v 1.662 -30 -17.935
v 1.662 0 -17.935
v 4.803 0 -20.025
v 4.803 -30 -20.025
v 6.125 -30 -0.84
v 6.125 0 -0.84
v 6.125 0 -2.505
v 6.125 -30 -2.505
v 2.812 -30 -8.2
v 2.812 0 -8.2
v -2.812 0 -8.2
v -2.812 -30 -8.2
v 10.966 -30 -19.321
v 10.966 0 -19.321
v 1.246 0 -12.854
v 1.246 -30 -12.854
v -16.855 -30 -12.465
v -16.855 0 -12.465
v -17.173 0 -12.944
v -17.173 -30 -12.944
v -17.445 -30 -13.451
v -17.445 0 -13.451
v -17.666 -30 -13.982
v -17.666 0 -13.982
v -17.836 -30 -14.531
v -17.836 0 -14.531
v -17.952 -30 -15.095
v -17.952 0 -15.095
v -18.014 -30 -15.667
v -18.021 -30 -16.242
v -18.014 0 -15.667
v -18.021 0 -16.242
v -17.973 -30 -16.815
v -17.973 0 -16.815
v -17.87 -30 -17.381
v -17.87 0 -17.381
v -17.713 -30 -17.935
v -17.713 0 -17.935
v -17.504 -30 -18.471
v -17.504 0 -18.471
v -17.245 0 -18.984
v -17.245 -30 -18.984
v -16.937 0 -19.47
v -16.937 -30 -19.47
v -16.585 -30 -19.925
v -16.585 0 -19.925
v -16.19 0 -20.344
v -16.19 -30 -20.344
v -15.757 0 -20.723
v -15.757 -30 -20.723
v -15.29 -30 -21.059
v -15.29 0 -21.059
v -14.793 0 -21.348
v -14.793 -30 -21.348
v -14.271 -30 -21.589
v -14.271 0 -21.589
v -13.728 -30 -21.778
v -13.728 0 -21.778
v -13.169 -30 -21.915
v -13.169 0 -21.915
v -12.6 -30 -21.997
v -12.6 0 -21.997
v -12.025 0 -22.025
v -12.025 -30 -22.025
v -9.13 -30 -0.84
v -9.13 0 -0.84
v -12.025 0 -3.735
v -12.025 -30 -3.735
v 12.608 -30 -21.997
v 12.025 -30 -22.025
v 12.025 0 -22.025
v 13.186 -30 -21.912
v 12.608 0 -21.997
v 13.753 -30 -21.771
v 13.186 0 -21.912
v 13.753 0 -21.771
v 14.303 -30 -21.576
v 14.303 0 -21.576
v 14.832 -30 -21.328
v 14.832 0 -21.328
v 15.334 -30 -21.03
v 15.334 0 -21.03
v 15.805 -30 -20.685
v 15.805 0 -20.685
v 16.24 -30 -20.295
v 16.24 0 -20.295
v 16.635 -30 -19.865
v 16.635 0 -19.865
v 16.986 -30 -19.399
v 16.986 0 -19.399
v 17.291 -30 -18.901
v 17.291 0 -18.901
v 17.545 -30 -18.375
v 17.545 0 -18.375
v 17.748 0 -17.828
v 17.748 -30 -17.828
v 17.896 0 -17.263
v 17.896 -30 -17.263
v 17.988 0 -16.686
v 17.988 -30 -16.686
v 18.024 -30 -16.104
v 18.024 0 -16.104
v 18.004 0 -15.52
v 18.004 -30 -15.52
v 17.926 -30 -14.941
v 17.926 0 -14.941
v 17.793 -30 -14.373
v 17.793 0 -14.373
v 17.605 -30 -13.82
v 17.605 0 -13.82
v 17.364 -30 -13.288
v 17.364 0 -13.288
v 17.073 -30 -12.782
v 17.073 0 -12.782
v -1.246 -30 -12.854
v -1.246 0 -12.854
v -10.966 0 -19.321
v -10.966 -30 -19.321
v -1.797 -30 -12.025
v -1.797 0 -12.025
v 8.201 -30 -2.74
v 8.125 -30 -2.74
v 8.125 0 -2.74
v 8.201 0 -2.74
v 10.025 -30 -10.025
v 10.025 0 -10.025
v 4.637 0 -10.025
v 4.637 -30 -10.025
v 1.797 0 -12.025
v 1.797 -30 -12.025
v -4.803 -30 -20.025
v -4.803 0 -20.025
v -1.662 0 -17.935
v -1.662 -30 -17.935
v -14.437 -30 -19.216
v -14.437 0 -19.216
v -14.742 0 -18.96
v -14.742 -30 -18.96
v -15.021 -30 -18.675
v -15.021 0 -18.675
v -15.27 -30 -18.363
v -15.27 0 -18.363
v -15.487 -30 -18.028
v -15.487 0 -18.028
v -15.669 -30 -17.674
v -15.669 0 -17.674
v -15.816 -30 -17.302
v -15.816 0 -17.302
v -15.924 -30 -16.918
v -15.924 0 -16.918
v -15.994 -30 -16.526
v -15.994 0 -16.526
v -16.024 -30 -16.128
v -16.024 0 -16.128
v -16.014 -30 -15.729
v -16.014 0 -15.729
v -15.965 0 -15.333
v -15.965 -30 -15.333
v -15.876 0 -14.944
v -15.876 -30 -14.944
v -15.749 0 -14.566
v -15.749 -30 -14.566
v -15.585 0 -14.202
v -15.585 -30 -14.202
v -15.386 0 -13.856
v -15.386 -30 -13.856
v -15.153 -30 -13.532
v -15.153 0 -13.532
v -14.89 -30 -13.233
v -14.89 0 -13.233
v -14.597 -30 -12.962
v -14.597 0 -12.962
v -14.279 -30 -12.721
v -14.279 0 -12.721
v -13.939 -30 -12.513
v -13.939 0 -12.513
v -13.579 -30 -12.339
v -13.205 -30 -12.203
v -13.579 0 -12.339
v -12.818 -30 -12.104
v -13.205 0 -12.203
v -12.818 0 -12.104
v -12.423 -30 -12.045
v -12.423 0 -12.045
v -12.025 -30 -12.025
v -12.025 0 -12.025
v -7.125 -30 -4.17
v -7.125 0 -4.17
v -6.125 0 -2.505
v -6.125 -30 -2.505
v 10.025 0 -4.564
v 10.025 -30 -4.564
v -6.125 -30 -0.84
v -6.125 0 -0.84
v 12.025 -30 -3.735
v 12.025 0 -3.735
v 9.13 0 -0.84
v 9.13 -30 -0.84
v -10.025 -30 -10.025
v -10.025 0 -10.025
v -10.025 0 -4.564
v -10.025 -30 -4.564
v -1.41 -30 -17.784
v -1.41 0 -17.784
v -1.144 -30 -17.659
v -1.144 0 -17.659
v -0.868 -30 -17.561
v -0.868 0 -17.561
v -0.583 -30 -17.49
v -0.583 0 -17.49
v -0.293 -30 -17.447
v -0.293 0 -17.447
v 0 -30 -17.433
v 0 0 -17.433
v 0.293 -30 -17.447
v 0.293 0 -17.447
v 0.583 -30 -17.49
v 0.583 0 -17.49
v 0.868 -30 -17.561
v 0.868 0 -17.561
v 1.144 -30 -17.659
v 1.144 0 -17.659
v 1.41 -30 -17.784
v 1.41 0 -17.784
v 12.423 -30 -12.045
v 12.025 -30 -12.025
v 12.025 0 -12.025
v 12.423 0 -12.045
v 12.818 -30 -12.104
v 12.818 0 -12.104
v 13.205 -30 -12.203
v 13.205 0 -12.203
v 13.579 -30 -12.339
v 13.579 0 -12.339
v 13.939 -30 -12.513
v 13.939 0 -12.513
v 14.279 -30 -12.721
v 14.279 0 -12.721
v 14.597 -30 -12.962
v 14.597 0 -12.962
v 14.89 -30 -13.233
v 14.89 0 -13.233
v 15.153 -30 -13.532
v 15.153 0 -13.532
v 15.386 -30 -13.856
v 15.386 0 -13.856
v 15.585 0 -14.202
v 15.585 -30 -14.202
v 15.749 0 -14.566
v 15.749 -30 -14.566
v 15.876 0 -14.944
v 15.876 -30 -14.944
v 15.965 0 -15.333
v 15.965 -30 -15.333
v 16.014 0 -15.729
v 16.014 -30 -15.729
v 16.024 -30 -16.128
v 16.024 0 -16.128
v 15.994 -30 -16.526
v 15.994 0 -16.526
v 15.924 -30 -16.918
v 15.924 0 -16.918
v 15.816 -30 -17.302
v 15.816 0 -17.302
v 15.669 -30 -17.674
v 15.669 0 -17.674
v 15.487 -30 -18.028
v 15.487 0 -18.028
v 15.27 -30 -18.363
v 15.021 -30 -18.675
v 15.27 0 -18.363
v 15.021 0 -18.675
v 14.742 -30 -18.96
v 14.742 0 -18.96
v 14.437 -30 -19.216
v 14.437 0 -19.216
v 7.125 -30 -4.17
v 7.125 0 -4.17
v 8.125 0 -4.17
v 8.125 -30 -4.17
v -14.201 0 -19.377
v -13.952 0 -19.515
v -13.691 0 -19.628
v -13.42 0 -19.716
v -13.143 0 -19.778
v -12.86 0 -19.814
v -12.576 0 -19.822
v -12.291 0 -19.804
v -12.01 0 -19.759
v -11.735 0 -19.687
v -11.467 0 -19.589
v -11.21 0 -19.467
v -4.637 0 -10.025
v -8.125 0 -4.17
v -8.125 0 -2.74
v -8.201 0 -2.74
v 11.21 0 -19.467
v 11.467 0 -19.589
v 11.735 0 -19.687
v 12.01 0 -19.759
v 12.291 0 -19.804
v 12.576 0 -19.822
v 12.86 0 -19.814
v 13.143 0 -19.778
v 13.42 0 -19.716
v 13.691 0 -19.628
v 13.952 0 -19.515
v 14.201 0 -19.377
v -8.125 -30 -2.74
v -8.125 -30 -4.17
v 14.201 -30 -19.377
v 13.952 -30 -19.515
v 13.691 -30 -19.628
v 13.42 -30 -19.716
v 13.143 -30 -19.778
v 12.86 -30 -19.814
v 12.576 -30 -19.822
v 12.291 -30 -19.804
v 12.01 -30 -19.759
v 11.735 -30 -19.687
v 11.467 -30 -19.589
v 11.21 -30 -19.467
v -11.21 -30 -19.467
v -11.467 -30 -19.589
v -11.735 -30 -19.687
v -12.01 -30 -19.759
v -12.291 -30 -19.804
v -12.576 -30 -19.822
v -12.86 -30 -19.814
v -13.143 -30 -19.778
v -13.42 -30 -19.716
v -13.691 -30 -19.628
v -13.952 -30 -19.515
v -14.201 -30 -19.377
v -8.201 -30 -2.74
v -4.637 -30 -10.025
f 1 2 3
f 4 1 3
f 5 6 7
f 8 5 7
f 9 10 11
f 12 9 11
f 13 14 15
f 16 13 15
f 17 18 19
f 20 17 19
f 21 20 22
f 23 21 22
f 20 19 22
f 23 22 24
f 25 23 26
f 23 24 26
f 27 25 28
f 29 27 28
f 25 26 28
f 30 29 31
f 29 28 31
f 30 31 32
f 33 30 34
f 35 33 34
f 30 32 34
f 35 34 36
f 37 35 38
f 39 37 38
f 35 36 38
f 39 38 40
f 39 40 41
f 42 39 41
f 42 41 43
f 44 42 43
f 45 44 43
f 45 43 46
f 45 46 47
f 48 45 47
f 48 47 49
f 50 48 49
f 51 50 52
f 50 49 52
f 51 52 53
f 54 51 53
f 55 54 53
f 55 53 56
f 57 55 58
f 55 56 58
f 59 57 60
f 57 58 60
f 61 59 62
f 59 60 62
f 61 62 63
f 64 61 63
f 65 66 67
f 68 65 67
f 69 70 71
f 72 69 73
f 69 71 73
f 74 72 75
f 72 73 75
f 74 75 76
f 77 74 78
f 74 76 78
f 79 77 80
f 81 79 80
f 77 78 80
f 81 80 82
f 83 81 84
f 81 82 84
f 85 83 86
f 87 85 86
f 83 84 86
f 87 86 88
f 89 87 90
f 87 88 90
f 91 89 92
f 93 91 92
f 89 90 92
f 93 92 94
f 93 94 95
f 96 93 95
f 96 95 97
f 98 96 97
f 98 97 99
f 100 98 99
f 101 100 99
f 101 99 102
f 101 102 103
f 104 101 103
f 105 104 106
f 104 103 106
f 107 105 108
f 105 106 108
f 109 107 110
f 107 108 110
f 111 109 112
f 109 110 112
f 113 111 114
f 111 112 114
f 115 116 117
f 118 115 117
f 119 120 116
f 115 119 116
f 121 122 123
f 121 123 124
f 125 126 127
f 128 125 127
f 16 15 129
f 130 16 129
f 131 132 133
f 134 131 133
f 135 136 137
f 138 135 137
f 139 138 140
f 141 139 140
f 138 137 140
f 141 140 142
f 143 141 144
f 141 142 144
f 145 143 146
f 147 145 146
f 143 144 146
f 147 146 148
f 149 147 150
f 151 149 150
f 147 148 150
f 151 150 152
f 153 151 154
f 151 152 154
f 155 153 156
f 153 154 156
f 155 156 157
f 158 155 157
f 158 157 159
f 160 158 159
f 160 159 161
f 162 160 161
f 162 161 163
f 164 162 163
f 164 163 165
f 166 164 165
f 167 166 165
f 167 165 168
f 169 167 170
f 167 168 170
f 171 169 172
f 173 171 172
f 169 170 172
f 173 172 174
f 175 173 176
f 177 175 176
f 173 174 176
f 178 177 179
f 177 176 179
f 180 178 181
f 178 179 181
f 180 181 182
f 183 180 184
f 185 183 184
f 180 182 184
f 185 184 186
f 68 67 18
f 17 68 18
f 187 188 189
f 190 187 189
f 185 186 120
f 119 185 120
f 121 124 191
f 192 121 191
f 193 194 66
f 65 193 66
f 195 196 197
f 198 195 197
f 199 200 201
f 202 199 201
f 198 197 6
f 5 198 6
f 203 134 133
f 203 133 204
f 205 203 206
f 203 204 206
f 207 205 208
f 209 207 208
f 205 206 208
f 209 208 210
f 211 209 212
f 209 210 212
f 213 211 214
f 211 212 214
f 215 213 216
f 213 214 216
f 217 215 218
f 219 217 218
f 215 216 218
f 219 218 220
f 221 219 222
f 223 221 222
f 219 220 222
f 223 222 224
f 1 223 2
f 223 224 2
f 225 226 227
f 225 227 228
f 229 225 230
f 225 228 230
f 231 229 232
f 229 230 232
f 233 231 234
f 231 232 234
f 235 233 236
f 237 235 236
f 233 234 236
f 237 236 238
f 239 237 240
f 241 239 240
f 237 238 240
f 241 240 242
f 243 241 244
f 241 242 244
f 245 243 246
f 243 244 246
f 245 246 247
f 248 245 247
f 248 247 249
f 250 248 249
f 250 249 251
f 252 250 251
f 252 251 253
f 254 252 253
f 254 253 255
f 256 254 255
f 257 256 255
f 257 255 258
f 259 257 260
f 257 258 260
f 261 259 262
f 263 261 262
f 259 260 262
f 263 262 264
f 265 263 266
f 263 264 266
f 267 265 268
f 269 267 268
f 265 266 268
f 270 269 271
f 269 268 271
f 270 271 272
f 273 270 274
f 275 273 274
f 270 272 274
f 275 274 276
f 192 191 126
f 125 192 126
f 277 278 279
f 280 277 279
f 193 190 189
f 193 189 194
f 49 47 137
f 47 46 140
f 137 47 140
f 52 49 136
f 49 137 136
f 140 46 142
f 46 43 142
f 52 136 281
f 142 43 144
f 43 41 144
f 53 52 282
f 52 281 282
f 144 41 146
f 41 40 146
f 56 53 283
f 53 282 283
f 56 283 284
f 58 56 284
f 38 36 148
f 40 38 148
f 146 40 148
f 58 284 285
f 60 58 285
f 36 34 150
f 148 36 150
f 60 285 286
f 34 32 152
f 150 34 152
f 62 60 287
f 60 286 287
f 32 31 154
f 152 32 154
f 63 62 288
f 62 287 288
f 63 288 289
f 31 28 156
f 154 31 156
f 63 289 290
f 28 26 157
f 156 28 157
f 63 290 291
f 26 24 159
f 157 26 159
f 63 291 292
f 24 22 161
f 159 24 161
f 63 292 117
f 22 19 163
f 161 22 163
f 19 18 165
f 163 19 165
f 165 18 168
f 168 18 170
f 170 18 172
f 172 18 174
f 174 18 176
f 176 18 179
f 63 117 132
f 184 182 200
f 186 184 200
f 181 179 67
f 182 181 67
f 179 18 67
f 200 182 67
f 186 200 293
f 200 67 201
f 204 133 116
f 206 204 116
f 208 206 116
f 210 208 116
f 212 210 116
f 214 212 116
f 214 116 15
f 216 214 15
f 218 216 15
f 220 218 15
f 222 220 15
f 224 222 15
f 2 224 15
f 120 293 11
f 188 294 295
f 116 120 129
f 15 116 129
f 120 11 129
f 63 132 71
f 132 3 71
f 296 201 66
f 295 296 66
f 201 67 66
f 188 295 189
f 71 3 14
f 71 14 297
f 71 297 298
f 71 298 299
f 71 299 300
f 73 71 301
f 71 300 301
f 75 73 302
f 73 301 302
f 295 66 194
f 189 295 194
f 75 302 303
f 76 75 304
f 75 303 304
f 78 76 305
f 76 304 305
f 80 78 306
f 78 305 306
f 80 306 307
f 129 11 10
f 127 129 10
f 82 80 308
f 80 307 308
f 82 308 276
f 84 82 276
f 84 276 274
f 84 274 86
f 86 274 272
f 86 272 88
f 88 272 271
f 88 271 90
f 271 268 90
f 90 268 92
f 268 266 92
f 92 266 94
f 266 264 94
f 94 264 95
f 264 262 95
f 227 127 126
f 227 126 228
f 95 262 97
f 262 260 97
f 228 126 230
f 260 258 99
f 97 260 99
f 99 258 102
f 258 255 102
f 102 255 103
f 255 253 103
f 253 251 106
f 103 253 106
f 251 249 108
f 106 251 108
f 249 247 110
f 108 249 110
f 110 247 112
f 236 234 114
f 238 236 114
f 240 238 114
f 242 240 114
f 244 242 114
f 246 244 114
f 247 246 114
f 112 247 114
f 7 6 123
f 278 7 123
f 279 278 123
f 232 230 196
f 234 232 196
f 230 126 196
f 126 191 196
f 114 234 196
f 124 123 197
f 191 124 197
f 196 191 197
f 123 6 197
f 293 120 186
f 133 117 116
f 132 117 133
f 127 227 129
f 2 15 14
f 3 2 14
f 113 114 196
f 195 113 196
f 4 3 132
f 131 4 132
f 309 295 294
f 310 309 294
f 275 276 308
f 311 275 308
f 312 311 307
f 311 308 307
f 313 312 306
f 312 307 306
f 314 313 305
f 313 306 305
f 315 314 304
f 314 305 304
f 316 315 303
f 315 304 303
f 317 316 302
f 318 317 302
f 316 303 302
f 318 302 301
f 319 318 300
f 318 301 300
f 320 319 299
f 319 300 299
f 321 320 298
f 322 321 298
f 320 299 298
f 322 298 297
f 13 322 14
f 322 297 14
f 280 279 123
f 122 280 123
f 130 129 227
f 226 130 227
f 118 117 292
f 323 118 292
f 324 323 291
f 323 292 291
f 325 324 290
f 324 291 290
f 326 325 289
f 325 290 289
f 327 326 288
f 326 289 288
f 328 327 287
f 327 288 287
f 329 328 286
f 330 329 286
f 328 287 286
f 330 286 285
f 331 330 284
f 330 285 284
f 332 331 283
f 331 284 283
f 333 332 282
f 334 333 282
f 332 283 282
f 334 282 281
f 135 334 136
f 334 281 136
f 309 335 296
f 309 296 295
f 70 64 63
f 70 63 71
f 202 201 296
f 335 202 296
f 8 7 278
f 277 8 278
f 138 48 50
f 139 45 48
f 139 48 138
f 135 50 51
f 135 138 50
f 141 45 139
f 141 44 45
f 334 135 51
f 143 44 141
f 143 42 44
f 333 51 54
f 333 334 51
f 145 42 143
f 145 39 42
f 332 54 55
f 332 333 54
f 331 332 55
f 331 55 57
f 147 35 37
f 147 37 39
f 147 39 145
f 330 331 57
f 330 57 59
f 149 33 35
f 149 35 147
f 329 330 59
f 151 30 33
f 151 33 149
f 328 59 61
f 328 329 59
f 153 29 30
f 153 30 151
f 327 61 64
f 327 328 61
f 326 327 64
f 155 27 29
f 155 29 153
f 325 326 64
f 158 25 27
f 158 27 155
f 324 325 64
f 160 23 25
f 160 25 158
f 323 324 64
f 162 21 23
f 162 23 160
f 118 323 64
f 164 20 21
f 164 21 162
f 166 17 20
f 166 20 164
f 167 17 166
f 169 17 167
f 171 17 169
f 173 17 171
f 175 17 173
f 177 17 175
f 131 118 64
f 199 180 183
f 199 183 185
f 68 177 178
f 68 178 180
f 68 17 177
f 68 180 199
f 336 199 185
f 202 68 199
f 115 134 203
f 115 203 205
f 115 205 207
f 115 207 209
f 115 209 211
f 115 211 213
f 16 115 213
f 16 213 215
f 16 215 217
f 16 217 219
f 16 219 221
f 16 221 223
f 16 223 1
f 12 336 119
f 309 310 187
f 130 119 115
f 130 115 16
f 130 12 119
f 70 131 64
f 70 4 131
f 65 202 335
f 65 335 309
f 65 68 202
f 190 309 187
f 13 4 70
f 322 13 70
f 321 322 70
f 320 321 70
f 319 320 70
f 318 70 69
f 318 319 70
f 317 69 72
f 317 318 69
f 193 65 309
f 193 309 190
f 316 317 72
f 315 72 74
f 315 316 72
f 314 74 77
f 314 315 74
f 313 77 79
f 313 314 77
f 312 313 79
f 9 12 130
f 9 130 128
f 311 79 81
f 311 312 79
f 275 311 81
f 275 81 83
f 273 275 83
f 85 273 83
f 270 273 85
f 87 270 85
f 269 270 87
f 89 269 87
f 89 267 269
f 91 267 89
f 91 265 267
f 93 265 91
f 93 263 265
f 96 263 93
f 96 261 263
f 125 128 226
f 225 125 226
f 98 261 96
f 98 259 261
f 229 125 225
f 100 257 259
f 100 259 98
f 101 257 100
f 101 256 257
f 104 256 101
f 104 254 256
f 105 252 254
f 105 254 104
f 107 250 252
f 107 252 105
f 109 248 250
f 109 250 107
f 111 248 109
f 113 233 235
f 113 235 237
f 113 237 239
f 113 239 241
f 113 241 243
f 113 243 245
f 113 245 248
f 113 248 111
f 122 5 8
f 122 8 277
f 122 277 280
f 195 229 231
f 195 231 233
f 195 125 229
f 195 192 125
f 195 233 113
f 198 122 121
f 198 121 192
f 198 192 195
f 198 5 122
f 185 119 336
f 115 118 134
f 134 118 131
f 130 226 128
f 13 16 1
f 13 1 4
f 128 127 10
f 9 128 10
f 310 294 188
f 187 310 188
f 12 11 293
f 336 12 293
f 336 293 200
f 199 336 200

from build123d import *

# Parameters (mm, degrees)
F1_DEPTH = 30


with BuildPart() as f1:
    # F0 (on Front) → F1 (new body)
    with BuildSketch(Plane.XZ):
        with BuildLine():
            Line((-10.025, -10.025), (-10.025, -4.563699))
            Line((-10.025, -4.563699), (-8.201301, -2.74))
            Line((-8.201301, -2.74), (-8.125, -2.74))
            Line((-8.125, -2.74), (-8.125, -4.16967))
            Line((-8.125, -4.16967), (-7.125, -4.16967))
            Line((-7.125, -4.16967), (-6.125, -2.504835))
            Line((-6.125, -2.504835), (-6.125, -0.84))
            Line((-6.125, -0.84), (-9.129728, -0.84))
            Line((-9.129728, -0.84), (-12.025, -3.735272))
            Line((-12.025, -3.735272), (-16.854638, -12.46486))
            ThreePointArc((-16.854638, -12.46486), (-17.38041, -18.730472), (-12.025, -22.025))
            Line((-12.025, -22.025), (12.025, -22.025))
            ThreePointArc((12.025, -22.025), (17.29087, -18.900868), (17.072982, -12.781872))
            Line((17.072982, -12.781872), (12.025, -3.735272))
            Line((12.025, -3.735272), (9.129728, -0.84))
            Line((9.129728, -0.84), (6.125, -0.84))
            Line((6.125, -0.84), (6.125, -2.504835))
            Line((6.125, -2.504835), (7.125, -4.16967))
            Line((7.125, -4.16967), (8.125, -4.16967))
            Line((8.125, -4.16967), (8.125, -2.74))
            Line((8.125, -2.74), (8.201301, -2.74))
            Line((8.201301, -2.74), (10.025, -4.563699))
            Line((10.025, -4.563699), (10.025, -10.025))
            Line((10.025, -10.025), (4.636716, -10.025))
            Line((4.636716, -10.025), (2.811716, -8.2))
            Line((2.811716, -8.2), (-2.811716, -8.2))
            Line((-2.811716, -8.2), (-4.636716, -10.025))
            Line((-4.636716, -10.025), (-8.125, -10.025))
            Line((-8.125, -10.025), (-10.025, -10.025))
        make_face()
        with BuildLine():
            ThreePointArc((-14.436503, -19.21634), (-15.81745, -14.753261), (-12.025, -12.025))
            Line((-12.025, -12.025), (-1.797092, -12.025))
            Line((-1.797092, -12.025), (-1.245732, -12.853762))
            Line((-1.245732, -12.853762), (-10.966173, -19.320583))
            ThreePointArc((-10.966173, -19.320583), (-12.71795, -19.821483), (-14.436503, -19.21634))
        make_face(mode=Mode.SUBTRACT)
        with BuildLine():
            Line((4.803493, -20.025), (-4.803493, -20.025))
            Line((-4.803493, -20.025), (-1.661703, -17.934828))
            ThreePointArc((-1.661703, -17.934828), (0, -17.432575), (1.661703, -17.934828))
            Line((1.661703, -17.934828), (4.803493, -20.025))
        make_face(mode=Mode.SUBTRACT)
        with BuildLine():
            ThreePointArc((12.025, -12.025), (15.81745, -14.753261), (14.436503, -19.21634))
            ThreePointArc((14.436503, -19.21634), (12.71795, -19.821483), (10.966173, -19.320583))
            Line((10.966173, -19.320583), (1.245732, -12.853762))
            Line((1.245732, -12.853762), (1.797092, -12.025))
            Line((1.797092, -12.025), (12.025, -12.025))
        make_face(mode=Mode.SUBTRACT)
    extrude(amount=F1_DEPTH)


solid = f1.part
